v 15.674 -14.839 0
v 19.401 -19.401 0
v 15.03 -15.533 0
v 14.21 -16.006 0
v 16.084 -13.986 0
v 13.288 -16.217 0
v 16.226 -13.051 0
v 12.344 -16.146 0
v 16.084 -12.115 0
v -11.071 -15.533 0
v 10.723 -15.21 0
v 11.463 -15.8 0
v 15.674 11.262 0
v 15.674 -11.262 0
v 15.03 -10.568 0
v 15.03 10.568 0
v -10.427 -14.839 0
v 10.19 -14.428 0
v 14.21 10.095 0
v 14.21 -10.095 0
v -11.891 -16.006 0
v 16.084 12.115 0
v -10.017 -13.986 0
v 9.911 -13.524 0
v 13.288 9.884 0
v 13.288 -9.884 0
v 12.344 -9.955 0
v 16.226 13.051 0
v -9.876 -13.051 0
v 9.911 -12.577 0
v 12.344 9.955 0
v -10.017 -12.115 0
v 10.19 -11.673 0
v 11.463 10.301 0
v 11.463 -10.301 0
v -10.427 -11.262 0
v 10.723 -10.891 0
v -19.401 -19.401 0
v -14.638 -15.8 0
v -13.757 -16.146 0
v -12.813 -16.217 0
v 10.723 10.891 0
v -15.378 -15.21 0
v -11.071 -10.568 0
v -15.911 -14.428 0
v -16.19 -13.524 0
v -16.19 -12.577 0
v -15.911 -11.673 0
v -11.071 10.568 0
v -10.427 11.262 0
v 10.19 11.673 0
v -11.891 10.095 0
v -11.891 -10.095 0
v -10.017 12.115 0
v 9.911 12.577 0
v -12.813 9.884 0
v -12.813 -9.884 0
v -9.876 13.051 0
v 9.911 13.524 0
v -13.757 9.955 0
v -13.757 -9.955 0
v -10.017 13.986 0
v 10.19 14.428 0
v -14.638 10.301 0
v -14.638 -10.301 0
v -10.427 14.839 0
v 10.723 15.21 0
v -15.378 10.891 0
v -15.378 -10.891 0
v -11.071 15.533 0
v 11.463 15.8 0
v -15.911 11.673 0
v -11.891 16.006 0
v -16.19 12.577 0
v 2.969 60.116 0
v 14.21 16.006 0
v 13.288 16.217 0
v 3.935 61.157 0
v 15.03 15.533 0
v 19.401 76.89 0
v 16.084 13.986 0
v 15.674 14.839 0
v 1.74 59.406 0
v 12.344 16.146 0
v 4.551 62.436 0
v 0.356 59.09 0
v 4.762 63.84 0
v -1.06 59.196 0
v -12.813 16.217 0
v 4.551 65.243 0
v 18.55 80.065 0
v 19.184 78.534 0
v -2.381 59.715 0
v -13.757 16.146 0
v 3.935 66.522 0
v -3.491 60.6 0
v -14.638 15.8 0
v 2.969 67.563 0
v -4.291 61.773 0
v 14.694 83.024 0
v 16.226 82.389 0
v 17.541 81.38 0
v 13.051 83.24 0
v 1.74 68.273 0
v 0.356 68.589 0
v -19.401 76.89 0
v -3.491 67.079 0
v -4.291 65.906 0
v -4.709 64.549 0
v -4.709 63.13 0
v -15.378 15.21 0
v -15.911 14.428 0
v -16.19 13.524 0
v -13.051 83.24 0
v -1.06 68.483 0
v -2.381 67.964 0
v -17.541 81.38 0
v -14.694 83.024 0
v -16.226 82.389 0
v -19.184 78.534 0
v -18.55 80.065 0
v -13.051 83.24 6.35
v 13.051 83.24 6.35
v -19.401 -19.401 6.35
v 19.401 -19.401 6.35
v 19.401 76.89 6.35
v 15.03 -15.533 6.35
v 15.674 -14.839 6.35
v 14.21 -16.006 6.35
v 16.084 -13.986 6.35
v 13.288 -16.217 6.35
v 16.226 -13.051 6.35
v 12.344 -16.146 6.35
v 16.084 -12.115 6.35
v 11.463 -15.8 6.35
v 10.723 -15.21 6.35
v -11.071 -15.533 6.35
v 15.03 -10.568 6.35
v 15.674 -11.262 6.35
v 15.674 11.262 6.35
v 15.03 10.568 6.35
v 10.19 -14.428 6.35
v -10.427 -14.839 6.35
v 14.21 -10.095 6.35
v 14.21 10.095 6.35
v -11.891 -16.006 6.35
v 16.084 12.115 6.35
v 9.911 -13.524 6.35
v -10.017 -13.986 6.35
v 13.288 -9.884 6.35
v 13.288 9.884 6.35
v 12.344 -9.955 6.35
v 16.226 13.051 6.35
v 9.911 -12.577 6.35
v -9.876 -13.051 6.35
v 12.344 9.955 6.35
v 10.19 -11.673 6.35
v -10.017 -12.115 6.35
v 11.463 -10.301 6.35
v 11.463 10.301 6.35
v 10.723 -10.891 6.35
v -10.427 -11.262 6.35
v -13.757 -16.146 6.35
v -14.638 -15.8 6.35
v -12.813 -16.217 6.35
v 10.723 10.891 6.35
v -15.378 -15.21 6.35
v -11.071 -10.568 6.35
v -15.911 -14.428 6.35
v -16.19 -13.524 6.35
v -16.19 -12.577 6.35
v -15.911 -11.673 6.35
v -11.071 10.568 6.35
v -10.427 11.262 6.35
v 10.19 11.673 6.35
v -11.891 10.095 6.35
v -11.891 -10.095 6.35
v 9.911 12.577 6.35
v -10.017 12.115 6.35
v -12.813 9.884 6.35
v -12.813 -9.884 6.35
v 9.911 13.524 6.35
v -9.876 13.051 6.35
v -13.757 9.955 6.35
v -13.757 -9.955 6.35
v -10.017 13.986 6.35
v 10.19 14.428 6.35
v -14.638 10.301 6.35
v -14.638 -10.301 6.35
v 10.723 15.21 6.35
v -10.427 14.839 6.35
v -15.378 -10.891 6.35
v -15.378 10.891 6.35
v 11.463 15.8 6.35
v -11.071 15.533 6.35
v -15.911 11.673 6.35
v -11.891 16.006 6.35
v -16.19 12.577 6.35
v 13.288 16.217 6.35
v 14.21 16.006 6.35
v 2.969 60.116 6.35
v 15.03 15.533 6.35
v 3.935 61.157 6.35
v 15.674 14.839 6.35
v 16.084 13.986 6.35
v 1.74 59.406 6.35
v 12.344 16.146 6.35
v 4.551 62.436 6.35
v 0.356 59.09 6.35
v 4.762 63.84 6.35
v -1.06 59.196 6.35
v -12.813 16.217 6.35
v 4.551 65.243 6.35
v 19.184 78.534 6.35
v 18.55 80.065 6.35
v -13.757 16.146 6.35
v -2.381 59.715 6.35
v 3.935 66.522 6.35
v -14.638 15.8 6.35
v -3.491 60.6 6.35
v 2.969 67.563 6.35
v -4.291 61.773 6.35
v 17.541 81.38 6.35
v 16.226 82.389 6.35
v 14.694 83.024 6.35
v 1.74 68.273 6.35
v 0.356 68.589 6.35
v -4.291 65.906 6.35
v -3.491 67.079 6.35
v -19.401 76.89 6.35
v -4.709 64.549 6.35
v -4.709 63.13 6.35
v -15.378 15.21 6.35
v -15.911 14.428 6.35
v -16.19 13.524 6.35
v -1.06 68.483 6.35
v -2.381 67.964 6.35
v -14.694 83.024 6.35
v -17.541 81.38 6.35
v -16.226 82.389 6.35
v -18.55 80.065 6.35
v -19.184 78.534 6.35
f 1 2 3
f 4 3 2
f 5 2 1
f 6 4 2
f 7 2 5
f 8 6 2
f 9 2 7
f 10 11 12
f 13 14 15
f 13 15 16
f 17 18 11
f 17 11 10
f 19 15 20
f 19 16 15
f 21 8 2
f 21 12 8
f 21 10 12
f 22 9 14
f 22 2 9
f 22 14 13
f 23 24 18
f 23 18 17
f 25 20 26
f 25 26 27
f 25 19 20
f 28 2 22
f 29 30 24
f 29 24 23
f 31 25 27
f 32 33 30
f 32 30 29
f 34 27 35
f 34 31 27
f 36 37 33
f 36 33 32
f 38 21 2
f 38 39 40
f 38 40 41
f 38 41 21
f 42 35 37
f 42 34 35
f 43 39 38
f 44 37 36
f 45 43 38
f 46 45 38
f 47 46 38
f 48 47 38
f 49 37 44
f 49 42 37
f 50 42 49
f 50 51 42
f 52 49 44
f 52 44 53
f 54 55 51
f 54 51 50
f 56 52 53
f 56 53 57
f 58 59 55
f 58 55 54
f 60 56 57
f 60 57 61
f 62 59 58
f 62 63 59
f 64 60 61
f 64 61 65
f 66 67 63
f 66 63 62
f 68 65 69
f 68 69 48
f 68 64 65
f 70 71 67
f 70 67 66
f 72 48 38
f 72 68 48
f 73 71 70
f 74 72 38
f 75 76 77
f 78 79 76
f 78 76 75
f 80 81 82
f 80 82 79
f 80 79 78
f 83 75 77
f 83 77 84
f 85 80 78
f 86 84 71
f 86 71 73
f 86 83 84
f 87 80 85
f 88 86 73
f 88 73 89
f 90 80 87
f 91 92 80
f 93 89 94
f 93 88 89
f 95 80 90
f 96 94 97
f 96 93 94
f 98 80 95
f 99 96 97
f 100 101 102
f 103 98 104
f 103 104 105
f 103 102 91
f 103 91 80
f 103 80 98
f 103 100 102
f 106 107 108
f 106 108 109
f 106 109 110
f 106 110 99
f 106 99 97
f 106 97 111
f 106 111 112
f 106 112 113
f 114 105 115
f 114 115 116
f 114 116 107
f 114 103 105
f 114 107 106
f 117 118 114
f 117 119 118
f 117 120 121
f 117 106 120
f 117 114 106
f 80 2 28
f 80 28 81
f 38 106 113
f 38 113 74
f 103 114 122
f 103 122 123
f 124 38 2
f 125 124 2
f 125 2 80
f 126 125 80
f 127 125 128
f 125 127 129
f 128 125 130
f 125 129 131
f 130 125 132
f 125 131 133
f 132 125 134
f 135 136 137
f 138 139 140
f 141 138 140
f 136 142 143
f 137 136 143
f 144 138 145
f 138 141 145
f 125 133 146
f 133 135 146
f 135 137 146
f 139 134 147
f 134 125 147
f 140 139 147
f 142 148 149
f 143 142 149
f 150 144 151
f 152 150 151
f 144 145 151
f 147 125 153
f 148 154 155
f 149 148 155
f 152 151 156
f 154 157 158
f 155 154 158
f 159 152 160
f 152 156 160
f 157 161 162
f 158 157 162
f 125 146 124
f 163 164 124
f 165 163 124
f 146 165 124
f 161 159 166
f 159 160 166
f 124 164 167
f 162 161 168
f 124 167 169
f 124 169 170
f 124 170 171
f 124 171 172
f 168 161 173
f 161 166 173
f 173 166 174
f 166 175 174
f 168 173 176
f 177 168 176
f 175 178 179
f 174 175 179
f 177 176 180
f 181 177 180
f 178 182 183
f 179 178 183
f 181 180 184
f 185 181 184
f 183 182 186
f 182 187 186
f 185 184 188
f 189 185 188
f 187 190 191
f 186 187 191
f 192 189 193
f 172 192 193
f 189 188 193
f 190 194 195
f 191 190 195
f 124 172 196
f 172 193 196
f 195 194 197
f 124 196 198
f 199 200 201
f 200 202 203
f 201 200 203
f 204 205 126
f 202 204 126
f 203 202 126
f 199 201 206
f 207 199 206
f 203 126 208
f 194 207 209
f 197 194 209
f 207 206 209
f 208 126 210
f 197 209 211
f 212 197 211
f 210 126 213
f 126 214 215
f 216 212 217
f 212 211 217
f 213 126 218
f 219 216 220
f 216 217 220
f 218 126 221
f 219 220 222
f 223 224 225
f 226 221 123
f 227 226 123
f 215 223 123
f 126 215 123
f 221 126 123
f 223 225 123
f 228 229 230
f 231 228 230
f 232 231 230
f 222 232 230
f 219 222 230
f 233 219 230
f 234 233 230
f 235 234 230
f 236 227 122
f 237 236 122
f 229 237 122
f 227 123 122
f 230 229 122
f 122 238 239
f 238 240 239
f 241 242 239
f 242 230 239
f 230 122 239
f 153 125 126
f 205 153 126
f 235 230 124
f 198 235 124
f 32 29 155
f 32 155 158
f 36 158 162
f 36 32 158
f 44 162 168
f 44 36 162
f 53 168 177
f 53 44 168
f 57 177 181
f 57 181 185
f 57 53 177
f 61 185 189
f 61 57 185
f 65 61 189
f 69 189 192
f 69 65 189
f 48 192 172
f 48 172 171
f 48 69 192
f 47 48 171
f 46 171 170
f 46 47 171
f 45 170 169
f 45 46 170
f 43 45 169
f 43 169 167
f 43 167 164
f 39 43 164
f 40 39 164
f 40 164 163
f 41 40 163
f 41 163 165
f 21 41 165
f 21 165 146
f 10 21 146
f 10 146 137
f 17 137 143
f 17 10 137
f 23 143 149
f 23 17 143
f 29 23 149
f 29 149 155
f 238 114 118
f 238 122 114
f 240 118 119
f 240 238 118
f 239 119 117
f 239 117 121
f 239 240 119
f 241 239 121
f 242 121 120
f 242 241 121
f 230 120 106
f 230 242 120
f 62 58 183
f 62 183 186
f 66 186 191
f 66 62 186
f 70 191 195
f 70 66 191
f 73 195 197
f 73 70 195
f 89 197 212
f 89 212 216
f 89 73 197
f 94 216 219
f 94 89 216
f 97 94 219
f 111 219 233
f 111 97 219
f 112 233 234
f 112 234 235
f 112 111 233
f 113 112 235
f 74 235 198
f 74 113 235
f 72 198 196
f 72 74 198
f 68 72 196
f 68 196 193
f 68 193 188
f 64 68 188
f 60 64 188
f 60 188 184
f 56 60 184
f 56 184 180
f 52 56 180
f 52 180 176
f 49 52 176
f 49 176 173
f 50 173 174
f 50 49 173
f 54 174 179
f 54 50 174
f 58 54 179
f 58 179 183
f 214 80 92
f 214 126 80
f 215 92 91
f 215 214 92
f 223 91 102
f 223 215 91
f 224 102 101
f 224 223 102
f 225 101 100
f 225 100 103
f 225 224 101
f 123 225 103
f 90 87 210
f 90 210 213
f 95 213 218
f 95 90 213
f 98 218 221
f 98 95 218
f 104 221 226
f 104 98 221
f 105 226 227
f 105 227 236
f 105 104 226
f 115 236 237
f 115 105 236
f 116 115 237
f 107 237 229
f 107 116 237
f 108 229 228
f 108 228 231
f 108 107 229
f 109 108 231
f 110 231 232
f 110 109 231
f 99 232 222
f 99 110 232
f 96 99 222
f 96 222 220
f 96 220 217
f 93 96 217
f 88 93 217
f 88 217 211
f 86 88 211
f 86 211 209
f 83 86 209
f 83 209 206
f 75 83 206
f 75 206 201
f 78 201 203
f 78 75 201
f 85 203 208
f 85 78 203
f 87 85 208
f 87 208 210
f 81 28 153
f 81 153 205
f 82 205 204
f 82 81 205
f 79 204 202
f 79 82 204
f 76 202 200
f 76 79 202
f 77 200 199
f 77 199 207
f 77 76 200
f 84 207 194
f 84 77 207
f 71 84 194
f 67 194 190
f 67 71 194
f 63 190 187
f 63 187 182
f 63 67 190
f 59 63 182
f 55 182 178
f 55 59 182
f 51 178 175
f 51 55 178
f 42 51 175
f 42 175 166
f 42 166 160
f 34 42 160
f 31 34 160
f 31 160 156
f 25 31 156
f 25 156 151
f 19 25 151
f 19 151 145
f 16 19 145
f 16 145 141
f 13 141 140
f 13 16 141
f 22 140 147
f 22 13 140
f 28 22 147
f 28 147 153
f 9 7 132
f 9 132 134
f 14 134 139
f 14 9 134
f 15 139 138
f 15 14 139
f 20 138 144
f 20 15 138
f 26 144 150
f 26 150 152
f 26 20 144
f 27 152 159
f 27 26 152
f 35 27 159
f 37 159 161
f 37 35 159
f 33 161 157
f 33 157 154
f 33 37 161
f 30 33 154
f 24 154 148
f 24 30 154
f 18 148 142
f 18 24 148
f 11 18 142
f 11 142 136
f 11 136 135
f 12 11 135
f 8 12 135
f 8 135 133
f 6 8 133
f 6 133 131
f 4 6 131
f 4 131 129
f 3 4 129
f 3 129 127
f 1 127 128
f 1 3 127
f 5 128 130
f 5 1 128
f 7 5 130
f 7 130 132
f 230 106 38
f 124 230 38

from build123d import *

# Parameters (mm, degrees)
SKETCH1_R           = 4.7625
SKETCH1_W           = 38.80104
SKETCH1_H           = 38.80104
SKETCH1_R_2         = 3.175
BOSS_EXTRUDE1_DEPTH = 6.35
FILLET1_R           = 6.35


with BuildPart() as part:
    # Sketch1 → Boss-Extrude1 (new body)
    with BuildSketch(Plane.XY):
        Polygon((19.40052, 19.40052), (-19.40052, 19.40052), (-19.40052, 44.4390625), (-19.40052, 83.2401025), (19.40052, 83.2401025), (19.40052, 44.4390625), align=None)
        with Locations((0, 63.8395825)):
            Circle(SKETCH1_R, mode=Mode.SUBTRACT)
        Rectangle(SKETCH1_W, SKETCH1_H)
        with Locations((13.05052, -13.05052)):
            Circle(SKETCH1_R_2, mode=Mode.SUBTRACT)
        with Locations((-13.05052, -13.05052)):
            Circle(SKETCH1_R_2, mode=Mode.SUBTRACT)
        with Locations((-13.05052, 13.05052)):
            Circle(SKETCH1_R_2, mode=Mode.SUBTRACT)
        with Locations((13.05052, 13.05052)):
            Circle(SKETCH1_R_2, mode=Mode.SUBTRACT)
    extrude(amount=BOSS_EXTRUDE1_DEPTH)

    # Fillet1
    fillet1_edges = [part.edges().sort_by_distance(p)[0] for p in [
        (-19.40052, 83.2401025, 3.175),
        (19.40052, 83.2401025, 3.175),
    ]]
    fillet(fillet1_edges, radius=FILLET1_R)


solid = part.part
